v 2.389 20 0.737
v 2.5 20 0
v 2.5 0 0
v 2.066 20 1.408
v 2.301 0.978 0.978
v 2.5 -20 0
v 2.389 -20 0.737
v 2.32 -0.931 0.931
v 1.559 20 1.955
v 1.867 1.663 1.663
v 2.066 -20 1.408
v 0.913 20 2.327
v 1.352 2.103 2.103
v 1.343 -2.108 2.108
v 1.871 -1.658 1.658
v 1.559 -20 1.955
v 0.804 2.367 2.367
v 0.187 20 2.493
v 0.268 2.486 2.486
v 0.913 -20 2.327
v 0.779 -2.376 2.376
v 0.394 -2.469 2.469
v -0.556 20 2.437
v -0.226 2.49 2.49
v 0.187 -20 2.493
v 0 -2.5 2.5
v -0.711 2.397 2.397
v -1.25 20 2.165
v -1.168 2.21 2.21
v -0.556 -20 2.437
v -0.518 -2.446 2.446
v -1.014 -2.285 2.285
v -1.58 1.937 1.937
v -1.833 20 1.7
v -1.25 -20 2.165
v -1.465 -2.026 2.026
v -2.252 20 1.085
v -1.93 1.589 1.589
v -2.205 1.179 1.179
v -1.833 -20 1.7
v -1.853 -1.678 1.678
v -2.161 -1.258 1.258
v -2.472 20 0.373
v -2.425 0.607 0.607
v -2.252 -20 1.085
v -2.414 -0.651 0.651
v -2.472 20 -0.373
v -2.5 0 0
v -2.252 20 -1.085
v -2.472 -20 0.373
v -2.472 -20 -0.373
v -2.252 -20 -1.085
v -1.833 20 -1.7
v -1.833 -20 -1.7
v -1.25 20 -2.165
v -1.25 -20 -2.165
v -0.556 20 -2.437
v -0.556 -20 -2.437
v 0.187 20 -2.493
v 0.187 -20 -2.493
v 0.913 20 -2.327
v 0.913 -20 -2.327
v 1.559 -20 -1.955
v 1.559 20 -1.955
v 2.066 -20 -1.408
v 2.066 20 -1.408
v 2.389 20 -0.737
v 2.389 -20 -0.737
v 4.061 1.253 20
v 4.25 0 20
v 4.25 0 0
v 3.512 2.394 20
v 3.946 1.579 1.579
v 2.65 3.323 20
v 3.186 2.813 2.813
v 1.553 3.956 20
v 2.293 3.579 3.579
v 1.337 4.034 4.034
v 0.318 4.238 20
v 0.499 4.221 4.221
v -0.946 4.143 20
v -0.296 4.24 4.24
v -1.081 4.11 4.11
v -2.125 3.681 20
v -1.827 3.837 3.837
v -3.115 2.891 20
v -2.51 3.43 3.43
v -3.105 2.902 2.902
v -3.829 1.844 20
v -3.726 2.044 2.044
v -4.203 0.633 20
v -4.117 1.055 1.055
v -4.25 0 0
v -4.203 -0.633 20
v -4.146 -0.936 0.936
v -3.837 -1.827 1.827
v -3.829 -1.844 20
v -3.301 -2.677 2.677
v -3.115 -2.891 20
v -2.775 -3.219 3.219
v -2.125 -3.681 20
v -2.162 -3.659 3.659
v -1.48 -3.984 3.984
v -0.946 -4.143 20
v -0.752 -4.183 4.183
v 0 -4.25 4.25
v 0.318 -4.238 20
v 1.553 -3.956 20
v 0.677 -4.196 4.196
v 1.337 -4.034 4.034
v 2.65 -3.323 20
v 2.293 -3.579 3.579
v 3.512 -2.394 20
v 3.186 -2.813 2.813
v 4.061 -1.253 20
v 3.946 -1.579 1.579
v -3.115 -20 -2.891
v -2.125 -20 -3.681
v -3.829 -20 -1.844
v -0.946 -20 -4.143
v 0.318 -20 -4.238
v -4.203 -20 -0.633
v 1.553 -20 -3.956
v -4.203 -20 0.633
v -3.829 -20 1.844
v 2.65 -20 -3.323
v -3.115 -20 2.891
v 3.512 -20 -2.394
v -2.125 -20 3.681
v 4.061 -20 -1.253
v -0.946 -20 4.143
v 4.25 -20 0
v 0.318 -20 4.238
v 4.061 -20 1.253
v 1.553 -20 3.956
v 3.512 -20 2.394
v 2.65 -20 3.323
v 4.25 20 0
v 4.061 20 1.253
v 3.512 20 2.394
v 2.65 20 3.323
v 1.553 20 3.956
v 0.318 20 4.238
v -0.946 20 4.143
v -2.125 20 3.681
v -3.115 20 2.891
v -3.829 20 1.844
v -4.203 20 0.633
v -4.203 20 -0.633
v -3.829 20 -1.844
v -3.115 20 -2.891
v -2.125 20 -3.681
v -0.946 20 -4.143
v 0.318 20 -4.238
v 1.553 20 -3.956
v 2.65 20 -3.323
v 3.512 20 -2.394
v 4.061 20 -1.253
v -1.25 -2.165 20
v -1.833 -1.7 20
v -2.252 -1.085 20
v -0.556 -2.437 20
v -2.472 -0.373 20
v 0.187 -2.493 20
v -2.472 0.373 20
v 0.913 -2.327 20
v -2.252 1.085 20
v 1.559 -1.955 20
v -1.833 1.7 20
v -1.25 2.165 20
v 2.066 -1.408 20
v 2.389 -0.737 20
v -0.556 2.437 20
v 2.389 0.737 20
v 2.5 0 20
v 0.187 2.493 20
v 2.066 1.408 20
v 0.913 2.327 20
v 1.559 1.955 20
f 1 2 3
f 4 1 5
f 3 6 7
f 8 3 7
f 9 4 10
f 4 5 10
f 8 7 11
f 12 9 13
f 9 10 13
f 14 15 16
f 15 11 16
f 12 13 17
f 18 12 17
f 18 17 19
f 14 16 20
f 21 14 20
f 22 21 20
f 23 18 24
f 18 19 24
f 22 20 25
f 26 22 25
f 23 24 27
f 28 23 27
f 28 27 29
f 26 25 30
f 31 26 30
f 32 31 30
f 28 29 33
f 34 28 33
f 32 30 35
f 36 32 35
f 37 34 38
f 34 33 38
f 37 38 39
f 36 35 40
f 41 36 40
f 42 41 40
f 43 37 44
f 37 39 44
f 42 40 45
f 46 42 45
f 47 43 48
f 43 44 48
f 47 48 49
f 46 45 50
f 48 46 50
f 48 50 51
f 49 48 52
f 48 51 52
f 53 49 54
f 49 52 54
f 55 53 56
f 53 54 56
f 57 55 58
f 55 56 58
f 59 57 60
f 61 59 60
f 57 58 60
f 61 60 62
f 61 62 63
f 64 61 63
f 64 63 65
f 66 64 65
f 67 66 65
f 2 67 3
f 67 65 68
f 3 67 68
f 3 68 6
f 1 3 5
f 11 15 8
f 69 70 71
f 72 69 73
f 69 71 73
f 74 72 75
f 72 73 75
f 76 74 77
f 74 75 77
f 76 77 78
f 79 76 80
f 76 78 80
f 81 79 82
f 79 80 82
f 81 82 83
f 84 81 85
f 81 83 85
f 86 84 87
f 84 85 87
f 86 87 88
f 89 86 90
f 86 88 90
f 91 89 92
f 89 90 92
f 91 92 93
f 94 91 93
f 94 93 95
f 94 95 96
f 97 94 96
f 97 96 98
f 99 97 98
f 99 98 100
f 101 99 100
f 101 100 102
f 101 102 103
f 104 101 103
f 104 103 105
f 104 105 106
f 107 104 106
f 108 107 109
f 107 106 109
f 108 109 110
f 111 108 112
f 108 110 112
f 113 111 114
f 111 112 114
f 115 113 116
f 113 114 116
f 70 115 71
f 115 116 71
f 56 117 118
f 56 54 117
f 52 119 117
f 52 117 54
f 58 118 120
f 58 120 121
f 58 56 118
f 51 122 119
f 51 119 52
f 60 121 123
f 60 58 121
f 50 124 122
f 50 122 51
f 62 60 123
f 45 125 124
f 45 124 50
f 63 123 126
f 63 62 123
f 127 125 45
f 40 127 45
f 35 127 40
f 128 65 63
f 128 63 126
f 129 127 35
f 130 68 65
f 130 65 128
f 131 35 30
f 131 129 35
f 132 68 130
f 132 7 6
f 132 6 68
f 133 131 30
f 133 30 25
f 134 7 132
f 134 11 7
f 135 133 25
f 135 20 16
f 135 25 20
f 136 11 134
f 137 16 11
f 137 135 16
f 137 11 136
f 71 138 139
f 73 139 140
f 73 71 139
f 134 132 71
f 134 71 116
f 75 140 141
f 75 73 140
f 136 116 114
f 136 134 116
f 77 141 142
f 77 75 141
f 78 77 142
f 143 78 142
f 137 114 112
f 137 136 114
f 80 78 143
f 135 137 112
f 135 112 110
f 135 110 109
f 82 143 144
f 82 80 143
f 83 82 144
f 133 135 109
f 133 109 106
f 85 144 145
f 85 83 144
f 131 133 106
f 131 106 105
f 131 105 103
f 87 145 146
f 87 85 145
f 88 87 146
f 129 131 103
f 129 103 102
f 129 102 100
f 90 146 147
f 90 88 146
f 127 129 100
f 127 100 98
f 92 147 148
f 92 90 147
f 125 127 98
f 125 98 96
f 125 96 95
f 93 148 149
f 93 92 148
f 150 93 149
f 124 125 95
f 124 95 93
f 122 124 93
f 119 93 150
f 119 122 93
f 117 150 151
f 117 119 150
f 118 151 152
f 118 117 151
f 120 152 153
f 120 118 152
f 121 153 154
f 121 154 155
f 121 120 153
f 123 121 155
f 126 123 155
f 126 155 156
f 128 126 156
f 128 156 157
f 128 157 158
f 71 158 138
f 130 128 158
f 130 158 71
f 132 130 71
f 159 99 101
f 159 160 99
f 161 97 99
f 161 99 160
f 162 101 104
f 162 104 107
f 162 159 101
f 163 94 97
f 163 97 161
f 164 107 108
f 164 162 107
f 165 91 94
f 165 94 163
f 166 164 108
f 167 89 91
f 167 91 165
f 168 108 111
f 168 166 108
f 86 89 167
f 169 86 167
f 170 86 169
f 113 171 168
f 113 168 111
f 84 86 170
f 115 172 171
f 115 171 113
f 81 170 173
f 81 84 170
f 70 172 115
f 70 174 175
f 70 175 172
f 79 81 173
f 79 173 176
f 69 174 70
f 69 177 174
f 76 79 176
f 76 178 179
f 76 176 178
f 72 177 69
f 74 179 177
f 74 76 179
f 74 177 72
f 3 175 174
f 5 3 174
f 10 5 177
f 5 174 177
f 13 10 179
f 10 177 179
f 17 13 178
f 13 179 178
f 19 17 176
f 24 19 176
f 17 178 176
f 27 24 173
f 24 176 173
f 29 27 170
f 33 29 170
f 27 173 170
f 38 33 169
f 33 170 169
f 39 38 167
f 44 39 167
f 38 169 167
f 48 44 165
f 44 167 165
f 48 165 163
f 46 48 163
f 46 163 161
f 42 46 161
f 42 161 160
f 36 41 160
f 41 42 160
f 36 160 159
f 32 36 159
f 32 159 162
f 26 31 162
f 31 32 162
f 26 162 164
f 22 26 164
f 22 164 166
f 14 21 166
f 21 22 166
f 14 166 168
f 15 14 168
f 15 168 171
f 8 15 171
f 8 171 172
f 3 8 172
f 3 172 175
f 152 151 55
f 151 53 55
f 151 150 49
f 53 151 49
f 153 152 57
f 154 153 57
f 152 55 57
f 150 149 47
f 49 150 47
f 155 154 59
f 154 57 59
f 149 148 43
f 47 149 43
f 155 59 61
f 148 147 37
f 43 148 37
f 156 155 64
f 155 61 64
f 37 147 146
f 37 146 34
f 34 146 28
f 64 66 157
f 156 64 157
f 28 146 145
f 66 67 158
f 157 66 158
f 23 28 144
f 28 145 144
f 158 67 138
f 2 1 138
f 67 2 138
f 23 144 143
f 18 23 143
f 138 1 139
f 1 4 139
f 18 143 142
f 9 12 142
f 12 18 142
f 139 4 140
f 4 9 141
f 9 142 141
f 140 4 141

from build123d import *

# Parameters (mm, degrees)
F1_R     = 4.25
F2_DEPTH = 20
F0_R     = 4.25
F4_DEPTH = 20
F3_R     = 2.5
F5_DEPTH = 40
F6_R     = 2.5
F7_DEPTH = 20


with BuildPart() as f2:
    # F1 (on Front) → F2 (new body, symmetric)
    with BuildSketch(Plane.XZ):
        Circle(F1_R)
    extrude(amount=F2_DEPTH, both=True)

    # F0 (on Top) → F4 (join)
    with BuildSketch(Plane.XY):
        Circle(F0_R)
    extrude(amount=F4_DEPTH)

    # F3 (on face) → F5 (cut)
    with BuildSketch(Plane.XZ.offset(20)):
        Circle(F3_R)
    extrude(amount=-F5_DEPTH, mode=Mode.SUBTRACT)

    # F6 (on face) → F7 (cut)
    with BuildSketch(Plane.XY.offset(20)):
        Circle(F6_R)
    extrude(amount=-F7_DEPTH, mode=Mode.SUBTRACT)


solid = f2.part
